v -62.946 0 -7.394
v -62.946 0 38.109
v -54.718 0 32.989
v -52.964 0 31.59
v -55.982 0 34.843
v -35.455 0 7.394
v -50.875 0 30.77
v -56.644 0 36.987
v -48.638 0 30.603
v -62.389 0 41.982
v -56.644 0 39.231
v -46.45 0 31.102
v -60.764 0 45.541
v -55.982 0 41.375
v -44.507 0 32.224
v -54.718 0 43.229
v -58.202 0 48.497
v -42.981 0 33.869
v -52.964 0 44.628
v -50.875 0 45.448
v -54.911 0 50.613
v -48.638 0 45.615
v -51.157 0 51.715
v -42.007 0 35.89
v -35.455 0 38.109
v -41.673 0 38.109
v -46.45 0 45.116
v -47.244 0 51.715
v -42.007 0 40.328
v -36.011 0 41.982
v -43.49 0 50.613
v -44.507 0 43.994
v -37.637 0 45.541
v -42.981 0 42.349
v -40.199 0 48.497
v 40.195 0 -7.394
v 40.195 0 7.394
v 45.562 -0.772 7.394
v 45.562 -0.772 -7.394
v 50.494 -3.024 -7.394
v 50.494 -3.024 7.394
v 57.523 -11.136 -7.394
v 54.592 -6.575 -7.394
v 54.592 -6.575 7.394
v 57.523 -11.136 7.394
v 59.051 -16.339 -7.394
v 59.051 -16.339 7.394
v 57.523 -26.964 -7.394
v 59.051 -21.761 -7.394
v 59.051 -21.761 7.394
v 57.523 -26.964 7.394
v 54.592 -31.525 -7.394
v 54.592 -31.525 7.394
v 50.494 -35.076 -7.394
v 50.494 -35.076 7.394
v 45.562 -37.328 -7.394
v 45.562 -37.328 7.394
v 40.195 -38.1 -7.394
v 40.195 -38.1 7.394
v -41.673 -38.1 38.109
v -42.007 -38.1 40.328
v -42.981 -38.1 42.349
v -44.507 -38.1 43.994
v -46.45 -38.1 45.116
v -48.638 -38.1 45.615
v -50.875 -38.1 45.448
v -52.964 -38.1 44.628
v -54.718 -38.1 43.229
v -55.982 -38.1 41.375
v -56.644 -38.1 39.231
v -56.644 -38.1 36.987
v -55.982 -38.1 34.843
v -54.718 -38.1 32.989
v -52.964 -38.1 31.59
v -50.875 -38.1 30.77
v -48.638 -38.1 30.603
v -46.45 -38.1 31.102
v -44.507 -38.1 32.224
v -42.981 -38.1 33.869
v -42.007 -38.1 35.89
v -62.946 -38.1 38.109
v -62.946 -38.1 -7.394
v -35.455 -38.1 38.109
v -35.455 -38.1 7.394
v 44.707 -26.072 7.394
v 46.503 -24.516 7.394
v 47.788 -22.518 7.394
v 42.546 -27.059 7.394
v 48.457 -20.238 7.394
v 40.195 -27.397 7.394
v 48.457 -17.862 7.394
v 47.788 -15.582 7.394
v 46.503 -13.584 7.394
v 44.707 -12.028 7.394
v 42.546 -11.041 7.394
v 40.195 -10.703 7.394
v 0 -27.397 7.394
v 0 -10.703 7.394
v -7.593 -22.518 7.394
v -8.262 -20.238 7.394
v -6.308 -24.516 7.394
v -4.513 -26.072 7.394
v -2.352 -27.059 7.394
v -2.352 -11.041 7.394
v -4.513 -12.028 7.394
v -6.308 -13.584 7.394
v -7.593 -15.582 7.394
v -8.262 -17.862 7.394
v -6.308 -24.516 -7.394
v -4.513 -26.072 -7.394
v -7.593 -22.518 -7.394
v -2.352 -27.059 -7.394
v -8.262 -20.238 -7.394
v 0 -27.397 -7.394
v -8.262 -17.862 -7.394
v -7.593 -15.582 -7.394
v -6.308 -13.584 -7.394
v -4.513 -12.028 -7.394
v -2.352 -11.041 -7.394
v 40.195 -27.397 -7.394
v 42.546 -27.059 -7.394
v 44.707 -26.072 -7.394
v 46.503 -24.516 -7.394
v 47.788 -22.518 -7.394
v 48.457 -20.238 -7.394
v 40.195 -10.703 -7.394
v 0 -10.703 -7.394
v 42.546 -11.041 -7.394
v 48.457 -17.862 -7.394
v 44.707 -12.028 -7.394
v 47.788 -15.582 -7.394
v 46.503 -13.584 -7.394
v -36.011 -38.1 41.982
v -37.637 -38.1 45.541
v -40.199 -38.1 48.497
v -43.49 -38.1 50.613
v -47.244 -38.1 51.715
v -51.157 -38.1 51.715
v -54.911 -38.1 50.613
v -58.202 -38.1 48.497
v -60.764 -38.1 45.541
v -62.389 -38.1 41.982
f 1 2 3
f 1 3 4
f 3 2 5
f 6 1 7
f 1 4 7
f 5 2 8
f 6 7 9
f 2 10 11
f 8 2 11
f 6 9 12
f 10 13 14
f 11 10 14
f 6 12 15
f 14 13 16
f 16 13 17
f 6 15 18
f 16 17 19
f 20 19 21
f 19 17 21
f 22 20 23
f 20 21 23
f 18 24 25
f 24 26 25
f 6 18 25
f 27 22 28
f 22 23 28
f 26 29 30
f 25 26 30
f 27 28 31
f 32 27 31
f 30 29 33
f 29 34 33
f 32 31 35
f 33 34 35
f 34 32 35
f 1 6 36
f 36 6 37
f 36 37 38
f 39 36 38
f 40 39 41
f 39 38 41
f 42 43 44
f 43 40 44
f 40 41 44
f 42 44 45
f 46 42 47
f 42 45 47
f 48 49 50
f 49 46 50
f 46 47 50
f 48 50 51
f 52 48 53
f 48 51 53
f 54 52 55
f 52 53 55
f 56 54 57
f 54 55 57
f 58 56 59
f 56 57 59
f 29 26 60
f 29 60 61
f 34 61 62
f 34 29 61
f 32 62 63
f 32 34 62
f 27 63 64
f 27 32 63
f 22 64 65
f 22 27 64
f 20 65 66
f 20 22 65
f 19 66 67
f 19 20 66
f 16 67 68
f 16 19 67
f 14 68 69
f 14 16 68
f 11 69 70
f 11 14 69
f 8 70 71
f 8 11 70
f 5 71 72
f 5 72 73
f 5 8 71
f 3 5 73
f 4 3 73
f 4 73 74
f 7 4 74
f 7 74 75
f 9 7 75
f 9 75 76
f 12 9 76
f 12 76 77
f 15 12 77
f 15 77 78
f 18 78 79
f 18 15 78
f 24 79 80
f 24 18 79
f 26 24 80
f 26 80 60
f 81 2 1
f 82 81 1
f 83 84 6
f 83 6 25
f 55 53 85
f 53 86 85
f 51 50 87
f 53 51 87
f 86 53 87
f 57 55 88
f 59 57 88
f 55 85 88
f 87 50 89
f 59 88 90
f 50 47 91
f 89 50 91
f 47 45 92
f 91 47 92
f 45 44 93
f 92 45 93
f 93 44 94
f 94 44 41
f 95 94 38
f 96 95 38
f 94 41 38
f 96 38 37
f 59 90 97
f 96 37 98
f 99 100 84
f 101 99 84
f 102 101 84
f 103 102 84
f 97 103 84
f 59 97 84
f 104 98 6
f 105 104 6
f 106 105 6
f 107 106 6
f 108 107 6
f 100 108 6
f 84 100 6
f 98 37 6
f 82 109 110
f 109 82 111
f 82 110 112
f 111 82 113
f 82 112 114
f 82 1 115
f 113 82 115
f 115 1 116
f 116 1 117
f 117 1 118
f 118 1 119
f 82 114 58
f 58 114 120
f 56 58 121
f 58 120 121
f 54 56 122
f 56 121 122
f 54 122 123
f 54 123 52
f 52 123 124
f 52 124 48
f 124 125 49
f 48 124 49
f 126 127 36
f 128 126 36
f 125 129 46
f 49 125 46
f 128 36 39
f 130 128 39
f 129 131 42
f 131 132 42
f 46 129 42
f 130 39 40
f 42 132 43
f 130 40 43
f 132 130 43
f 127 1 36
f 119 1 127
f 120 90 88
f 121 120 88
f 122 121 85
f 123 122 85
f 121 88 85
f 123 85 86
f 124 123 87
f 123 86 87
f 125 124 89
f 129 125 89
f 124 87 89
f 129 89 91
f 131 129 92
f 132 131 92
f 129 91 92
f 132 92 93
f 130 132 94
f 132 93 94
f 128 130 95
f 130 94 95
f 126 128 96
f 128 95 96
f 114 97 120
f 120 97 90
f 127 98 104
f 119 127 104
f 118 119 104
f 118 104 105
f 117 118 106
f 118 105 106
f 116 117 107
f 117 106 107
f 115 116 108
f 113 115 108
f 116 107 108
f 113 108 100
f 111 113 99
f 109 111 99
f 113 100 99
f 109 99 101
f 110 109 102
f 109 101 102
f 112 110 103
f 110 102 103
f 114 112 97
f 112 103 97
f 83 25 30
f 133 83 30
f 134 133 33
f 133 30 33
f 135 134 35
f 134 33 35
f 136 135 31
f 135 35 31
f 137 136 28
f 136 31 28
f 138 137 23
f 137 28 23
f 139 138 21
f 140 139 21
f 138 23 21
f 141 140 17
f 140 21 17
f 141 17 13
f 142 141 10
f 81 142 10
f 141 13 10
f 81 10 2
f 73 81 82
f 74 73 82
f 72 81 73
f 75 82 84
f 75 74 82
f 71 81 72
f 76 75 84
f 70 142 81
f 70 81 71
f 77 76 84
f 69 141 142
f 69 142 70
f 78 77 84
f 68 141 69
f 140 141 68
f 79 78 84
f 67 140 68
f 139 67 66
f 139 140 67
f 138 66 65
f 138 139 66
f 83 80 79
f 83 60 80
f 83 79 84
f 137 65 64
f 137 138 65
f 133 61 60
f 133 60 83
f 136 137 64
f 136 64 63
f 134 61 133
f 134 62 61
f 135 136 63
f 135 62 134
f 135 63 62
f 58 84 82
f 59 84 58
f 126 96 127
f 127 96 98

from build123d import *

# Parameters (mm, degrees)
F0_R     = 7.527389
F1_DEPTH = 38.1
F3_DEPTH = 14.789578
F4_DEPTH = 14.789578


with BuildPart() as f1:
    # F0 (on Front) → F1 (new body)
    with BuildSketch(Plane.XZ):
        with BuildLine():
            Line((-62.946253, -7.394289), (62.946253, -7.394289))
            Line((62.946253, -7.394289), (62.946253, 7.394289))
            Line((62.946253, 7.394289), (-35.454668, 7.394289))
            Line((-35.454668, 7.394289), (-35.454668, 38.109027))
            ThreePointArc((-35.454668, 38.109027), (-49.20046, 51.854819), (-62.946253, 38.109027))
            Line((-62.946253, 38.109027), (-62.946253, 7.394289))
            Line((-62.946253, 7.394289), (-62.946253, -7.394289))
        make_face()
        with Locations((-49.20046, 38.109027)):
            Circle(F0_R, mode=Mode.SUBTRACT)
    extrude(amount=F1_DEPTH)

    # F2 (on face) → F3 (cut, through all)
    with BuildSketch(Plane.XY.offset(7.394289)):
        with BuildLine():
            Line((0, -27.397288), (40.194597, -27.397288))
            ThreePointArc((40.194597, -27.397288), (48.541885, -19.05), (40.194597, -10.702712))
            Line((40.194597, -10.702712), (0, -10.702712))
            ThreePointArc((0, -10.702712), (-8.347288, -19.05), (0, -27.397288))
        make_face()
    extrude(amount=-F3_DEPTH, mode=Mode.SUBTRACT)

    # F2 (on face) → F4 (cut, through all)
    with BuildSketch(Plane.XY.offset(7.394289)):
        with BuildLine():
            Line((62.946253, 0), (40.194597, 0))
            ThreePointArc((40.194597, 0), (59.244597, -19.05), (40.194597, -38.1))
            Line((40.194597, -38.1), (62.946253, -38.1))
            Line((62.946253, -38.1), (62.946253, 0))
        make_face()
    extrude(amount=-F4_DEPTH, mode=Mode.SUBTRACT)


solid = f1.part
